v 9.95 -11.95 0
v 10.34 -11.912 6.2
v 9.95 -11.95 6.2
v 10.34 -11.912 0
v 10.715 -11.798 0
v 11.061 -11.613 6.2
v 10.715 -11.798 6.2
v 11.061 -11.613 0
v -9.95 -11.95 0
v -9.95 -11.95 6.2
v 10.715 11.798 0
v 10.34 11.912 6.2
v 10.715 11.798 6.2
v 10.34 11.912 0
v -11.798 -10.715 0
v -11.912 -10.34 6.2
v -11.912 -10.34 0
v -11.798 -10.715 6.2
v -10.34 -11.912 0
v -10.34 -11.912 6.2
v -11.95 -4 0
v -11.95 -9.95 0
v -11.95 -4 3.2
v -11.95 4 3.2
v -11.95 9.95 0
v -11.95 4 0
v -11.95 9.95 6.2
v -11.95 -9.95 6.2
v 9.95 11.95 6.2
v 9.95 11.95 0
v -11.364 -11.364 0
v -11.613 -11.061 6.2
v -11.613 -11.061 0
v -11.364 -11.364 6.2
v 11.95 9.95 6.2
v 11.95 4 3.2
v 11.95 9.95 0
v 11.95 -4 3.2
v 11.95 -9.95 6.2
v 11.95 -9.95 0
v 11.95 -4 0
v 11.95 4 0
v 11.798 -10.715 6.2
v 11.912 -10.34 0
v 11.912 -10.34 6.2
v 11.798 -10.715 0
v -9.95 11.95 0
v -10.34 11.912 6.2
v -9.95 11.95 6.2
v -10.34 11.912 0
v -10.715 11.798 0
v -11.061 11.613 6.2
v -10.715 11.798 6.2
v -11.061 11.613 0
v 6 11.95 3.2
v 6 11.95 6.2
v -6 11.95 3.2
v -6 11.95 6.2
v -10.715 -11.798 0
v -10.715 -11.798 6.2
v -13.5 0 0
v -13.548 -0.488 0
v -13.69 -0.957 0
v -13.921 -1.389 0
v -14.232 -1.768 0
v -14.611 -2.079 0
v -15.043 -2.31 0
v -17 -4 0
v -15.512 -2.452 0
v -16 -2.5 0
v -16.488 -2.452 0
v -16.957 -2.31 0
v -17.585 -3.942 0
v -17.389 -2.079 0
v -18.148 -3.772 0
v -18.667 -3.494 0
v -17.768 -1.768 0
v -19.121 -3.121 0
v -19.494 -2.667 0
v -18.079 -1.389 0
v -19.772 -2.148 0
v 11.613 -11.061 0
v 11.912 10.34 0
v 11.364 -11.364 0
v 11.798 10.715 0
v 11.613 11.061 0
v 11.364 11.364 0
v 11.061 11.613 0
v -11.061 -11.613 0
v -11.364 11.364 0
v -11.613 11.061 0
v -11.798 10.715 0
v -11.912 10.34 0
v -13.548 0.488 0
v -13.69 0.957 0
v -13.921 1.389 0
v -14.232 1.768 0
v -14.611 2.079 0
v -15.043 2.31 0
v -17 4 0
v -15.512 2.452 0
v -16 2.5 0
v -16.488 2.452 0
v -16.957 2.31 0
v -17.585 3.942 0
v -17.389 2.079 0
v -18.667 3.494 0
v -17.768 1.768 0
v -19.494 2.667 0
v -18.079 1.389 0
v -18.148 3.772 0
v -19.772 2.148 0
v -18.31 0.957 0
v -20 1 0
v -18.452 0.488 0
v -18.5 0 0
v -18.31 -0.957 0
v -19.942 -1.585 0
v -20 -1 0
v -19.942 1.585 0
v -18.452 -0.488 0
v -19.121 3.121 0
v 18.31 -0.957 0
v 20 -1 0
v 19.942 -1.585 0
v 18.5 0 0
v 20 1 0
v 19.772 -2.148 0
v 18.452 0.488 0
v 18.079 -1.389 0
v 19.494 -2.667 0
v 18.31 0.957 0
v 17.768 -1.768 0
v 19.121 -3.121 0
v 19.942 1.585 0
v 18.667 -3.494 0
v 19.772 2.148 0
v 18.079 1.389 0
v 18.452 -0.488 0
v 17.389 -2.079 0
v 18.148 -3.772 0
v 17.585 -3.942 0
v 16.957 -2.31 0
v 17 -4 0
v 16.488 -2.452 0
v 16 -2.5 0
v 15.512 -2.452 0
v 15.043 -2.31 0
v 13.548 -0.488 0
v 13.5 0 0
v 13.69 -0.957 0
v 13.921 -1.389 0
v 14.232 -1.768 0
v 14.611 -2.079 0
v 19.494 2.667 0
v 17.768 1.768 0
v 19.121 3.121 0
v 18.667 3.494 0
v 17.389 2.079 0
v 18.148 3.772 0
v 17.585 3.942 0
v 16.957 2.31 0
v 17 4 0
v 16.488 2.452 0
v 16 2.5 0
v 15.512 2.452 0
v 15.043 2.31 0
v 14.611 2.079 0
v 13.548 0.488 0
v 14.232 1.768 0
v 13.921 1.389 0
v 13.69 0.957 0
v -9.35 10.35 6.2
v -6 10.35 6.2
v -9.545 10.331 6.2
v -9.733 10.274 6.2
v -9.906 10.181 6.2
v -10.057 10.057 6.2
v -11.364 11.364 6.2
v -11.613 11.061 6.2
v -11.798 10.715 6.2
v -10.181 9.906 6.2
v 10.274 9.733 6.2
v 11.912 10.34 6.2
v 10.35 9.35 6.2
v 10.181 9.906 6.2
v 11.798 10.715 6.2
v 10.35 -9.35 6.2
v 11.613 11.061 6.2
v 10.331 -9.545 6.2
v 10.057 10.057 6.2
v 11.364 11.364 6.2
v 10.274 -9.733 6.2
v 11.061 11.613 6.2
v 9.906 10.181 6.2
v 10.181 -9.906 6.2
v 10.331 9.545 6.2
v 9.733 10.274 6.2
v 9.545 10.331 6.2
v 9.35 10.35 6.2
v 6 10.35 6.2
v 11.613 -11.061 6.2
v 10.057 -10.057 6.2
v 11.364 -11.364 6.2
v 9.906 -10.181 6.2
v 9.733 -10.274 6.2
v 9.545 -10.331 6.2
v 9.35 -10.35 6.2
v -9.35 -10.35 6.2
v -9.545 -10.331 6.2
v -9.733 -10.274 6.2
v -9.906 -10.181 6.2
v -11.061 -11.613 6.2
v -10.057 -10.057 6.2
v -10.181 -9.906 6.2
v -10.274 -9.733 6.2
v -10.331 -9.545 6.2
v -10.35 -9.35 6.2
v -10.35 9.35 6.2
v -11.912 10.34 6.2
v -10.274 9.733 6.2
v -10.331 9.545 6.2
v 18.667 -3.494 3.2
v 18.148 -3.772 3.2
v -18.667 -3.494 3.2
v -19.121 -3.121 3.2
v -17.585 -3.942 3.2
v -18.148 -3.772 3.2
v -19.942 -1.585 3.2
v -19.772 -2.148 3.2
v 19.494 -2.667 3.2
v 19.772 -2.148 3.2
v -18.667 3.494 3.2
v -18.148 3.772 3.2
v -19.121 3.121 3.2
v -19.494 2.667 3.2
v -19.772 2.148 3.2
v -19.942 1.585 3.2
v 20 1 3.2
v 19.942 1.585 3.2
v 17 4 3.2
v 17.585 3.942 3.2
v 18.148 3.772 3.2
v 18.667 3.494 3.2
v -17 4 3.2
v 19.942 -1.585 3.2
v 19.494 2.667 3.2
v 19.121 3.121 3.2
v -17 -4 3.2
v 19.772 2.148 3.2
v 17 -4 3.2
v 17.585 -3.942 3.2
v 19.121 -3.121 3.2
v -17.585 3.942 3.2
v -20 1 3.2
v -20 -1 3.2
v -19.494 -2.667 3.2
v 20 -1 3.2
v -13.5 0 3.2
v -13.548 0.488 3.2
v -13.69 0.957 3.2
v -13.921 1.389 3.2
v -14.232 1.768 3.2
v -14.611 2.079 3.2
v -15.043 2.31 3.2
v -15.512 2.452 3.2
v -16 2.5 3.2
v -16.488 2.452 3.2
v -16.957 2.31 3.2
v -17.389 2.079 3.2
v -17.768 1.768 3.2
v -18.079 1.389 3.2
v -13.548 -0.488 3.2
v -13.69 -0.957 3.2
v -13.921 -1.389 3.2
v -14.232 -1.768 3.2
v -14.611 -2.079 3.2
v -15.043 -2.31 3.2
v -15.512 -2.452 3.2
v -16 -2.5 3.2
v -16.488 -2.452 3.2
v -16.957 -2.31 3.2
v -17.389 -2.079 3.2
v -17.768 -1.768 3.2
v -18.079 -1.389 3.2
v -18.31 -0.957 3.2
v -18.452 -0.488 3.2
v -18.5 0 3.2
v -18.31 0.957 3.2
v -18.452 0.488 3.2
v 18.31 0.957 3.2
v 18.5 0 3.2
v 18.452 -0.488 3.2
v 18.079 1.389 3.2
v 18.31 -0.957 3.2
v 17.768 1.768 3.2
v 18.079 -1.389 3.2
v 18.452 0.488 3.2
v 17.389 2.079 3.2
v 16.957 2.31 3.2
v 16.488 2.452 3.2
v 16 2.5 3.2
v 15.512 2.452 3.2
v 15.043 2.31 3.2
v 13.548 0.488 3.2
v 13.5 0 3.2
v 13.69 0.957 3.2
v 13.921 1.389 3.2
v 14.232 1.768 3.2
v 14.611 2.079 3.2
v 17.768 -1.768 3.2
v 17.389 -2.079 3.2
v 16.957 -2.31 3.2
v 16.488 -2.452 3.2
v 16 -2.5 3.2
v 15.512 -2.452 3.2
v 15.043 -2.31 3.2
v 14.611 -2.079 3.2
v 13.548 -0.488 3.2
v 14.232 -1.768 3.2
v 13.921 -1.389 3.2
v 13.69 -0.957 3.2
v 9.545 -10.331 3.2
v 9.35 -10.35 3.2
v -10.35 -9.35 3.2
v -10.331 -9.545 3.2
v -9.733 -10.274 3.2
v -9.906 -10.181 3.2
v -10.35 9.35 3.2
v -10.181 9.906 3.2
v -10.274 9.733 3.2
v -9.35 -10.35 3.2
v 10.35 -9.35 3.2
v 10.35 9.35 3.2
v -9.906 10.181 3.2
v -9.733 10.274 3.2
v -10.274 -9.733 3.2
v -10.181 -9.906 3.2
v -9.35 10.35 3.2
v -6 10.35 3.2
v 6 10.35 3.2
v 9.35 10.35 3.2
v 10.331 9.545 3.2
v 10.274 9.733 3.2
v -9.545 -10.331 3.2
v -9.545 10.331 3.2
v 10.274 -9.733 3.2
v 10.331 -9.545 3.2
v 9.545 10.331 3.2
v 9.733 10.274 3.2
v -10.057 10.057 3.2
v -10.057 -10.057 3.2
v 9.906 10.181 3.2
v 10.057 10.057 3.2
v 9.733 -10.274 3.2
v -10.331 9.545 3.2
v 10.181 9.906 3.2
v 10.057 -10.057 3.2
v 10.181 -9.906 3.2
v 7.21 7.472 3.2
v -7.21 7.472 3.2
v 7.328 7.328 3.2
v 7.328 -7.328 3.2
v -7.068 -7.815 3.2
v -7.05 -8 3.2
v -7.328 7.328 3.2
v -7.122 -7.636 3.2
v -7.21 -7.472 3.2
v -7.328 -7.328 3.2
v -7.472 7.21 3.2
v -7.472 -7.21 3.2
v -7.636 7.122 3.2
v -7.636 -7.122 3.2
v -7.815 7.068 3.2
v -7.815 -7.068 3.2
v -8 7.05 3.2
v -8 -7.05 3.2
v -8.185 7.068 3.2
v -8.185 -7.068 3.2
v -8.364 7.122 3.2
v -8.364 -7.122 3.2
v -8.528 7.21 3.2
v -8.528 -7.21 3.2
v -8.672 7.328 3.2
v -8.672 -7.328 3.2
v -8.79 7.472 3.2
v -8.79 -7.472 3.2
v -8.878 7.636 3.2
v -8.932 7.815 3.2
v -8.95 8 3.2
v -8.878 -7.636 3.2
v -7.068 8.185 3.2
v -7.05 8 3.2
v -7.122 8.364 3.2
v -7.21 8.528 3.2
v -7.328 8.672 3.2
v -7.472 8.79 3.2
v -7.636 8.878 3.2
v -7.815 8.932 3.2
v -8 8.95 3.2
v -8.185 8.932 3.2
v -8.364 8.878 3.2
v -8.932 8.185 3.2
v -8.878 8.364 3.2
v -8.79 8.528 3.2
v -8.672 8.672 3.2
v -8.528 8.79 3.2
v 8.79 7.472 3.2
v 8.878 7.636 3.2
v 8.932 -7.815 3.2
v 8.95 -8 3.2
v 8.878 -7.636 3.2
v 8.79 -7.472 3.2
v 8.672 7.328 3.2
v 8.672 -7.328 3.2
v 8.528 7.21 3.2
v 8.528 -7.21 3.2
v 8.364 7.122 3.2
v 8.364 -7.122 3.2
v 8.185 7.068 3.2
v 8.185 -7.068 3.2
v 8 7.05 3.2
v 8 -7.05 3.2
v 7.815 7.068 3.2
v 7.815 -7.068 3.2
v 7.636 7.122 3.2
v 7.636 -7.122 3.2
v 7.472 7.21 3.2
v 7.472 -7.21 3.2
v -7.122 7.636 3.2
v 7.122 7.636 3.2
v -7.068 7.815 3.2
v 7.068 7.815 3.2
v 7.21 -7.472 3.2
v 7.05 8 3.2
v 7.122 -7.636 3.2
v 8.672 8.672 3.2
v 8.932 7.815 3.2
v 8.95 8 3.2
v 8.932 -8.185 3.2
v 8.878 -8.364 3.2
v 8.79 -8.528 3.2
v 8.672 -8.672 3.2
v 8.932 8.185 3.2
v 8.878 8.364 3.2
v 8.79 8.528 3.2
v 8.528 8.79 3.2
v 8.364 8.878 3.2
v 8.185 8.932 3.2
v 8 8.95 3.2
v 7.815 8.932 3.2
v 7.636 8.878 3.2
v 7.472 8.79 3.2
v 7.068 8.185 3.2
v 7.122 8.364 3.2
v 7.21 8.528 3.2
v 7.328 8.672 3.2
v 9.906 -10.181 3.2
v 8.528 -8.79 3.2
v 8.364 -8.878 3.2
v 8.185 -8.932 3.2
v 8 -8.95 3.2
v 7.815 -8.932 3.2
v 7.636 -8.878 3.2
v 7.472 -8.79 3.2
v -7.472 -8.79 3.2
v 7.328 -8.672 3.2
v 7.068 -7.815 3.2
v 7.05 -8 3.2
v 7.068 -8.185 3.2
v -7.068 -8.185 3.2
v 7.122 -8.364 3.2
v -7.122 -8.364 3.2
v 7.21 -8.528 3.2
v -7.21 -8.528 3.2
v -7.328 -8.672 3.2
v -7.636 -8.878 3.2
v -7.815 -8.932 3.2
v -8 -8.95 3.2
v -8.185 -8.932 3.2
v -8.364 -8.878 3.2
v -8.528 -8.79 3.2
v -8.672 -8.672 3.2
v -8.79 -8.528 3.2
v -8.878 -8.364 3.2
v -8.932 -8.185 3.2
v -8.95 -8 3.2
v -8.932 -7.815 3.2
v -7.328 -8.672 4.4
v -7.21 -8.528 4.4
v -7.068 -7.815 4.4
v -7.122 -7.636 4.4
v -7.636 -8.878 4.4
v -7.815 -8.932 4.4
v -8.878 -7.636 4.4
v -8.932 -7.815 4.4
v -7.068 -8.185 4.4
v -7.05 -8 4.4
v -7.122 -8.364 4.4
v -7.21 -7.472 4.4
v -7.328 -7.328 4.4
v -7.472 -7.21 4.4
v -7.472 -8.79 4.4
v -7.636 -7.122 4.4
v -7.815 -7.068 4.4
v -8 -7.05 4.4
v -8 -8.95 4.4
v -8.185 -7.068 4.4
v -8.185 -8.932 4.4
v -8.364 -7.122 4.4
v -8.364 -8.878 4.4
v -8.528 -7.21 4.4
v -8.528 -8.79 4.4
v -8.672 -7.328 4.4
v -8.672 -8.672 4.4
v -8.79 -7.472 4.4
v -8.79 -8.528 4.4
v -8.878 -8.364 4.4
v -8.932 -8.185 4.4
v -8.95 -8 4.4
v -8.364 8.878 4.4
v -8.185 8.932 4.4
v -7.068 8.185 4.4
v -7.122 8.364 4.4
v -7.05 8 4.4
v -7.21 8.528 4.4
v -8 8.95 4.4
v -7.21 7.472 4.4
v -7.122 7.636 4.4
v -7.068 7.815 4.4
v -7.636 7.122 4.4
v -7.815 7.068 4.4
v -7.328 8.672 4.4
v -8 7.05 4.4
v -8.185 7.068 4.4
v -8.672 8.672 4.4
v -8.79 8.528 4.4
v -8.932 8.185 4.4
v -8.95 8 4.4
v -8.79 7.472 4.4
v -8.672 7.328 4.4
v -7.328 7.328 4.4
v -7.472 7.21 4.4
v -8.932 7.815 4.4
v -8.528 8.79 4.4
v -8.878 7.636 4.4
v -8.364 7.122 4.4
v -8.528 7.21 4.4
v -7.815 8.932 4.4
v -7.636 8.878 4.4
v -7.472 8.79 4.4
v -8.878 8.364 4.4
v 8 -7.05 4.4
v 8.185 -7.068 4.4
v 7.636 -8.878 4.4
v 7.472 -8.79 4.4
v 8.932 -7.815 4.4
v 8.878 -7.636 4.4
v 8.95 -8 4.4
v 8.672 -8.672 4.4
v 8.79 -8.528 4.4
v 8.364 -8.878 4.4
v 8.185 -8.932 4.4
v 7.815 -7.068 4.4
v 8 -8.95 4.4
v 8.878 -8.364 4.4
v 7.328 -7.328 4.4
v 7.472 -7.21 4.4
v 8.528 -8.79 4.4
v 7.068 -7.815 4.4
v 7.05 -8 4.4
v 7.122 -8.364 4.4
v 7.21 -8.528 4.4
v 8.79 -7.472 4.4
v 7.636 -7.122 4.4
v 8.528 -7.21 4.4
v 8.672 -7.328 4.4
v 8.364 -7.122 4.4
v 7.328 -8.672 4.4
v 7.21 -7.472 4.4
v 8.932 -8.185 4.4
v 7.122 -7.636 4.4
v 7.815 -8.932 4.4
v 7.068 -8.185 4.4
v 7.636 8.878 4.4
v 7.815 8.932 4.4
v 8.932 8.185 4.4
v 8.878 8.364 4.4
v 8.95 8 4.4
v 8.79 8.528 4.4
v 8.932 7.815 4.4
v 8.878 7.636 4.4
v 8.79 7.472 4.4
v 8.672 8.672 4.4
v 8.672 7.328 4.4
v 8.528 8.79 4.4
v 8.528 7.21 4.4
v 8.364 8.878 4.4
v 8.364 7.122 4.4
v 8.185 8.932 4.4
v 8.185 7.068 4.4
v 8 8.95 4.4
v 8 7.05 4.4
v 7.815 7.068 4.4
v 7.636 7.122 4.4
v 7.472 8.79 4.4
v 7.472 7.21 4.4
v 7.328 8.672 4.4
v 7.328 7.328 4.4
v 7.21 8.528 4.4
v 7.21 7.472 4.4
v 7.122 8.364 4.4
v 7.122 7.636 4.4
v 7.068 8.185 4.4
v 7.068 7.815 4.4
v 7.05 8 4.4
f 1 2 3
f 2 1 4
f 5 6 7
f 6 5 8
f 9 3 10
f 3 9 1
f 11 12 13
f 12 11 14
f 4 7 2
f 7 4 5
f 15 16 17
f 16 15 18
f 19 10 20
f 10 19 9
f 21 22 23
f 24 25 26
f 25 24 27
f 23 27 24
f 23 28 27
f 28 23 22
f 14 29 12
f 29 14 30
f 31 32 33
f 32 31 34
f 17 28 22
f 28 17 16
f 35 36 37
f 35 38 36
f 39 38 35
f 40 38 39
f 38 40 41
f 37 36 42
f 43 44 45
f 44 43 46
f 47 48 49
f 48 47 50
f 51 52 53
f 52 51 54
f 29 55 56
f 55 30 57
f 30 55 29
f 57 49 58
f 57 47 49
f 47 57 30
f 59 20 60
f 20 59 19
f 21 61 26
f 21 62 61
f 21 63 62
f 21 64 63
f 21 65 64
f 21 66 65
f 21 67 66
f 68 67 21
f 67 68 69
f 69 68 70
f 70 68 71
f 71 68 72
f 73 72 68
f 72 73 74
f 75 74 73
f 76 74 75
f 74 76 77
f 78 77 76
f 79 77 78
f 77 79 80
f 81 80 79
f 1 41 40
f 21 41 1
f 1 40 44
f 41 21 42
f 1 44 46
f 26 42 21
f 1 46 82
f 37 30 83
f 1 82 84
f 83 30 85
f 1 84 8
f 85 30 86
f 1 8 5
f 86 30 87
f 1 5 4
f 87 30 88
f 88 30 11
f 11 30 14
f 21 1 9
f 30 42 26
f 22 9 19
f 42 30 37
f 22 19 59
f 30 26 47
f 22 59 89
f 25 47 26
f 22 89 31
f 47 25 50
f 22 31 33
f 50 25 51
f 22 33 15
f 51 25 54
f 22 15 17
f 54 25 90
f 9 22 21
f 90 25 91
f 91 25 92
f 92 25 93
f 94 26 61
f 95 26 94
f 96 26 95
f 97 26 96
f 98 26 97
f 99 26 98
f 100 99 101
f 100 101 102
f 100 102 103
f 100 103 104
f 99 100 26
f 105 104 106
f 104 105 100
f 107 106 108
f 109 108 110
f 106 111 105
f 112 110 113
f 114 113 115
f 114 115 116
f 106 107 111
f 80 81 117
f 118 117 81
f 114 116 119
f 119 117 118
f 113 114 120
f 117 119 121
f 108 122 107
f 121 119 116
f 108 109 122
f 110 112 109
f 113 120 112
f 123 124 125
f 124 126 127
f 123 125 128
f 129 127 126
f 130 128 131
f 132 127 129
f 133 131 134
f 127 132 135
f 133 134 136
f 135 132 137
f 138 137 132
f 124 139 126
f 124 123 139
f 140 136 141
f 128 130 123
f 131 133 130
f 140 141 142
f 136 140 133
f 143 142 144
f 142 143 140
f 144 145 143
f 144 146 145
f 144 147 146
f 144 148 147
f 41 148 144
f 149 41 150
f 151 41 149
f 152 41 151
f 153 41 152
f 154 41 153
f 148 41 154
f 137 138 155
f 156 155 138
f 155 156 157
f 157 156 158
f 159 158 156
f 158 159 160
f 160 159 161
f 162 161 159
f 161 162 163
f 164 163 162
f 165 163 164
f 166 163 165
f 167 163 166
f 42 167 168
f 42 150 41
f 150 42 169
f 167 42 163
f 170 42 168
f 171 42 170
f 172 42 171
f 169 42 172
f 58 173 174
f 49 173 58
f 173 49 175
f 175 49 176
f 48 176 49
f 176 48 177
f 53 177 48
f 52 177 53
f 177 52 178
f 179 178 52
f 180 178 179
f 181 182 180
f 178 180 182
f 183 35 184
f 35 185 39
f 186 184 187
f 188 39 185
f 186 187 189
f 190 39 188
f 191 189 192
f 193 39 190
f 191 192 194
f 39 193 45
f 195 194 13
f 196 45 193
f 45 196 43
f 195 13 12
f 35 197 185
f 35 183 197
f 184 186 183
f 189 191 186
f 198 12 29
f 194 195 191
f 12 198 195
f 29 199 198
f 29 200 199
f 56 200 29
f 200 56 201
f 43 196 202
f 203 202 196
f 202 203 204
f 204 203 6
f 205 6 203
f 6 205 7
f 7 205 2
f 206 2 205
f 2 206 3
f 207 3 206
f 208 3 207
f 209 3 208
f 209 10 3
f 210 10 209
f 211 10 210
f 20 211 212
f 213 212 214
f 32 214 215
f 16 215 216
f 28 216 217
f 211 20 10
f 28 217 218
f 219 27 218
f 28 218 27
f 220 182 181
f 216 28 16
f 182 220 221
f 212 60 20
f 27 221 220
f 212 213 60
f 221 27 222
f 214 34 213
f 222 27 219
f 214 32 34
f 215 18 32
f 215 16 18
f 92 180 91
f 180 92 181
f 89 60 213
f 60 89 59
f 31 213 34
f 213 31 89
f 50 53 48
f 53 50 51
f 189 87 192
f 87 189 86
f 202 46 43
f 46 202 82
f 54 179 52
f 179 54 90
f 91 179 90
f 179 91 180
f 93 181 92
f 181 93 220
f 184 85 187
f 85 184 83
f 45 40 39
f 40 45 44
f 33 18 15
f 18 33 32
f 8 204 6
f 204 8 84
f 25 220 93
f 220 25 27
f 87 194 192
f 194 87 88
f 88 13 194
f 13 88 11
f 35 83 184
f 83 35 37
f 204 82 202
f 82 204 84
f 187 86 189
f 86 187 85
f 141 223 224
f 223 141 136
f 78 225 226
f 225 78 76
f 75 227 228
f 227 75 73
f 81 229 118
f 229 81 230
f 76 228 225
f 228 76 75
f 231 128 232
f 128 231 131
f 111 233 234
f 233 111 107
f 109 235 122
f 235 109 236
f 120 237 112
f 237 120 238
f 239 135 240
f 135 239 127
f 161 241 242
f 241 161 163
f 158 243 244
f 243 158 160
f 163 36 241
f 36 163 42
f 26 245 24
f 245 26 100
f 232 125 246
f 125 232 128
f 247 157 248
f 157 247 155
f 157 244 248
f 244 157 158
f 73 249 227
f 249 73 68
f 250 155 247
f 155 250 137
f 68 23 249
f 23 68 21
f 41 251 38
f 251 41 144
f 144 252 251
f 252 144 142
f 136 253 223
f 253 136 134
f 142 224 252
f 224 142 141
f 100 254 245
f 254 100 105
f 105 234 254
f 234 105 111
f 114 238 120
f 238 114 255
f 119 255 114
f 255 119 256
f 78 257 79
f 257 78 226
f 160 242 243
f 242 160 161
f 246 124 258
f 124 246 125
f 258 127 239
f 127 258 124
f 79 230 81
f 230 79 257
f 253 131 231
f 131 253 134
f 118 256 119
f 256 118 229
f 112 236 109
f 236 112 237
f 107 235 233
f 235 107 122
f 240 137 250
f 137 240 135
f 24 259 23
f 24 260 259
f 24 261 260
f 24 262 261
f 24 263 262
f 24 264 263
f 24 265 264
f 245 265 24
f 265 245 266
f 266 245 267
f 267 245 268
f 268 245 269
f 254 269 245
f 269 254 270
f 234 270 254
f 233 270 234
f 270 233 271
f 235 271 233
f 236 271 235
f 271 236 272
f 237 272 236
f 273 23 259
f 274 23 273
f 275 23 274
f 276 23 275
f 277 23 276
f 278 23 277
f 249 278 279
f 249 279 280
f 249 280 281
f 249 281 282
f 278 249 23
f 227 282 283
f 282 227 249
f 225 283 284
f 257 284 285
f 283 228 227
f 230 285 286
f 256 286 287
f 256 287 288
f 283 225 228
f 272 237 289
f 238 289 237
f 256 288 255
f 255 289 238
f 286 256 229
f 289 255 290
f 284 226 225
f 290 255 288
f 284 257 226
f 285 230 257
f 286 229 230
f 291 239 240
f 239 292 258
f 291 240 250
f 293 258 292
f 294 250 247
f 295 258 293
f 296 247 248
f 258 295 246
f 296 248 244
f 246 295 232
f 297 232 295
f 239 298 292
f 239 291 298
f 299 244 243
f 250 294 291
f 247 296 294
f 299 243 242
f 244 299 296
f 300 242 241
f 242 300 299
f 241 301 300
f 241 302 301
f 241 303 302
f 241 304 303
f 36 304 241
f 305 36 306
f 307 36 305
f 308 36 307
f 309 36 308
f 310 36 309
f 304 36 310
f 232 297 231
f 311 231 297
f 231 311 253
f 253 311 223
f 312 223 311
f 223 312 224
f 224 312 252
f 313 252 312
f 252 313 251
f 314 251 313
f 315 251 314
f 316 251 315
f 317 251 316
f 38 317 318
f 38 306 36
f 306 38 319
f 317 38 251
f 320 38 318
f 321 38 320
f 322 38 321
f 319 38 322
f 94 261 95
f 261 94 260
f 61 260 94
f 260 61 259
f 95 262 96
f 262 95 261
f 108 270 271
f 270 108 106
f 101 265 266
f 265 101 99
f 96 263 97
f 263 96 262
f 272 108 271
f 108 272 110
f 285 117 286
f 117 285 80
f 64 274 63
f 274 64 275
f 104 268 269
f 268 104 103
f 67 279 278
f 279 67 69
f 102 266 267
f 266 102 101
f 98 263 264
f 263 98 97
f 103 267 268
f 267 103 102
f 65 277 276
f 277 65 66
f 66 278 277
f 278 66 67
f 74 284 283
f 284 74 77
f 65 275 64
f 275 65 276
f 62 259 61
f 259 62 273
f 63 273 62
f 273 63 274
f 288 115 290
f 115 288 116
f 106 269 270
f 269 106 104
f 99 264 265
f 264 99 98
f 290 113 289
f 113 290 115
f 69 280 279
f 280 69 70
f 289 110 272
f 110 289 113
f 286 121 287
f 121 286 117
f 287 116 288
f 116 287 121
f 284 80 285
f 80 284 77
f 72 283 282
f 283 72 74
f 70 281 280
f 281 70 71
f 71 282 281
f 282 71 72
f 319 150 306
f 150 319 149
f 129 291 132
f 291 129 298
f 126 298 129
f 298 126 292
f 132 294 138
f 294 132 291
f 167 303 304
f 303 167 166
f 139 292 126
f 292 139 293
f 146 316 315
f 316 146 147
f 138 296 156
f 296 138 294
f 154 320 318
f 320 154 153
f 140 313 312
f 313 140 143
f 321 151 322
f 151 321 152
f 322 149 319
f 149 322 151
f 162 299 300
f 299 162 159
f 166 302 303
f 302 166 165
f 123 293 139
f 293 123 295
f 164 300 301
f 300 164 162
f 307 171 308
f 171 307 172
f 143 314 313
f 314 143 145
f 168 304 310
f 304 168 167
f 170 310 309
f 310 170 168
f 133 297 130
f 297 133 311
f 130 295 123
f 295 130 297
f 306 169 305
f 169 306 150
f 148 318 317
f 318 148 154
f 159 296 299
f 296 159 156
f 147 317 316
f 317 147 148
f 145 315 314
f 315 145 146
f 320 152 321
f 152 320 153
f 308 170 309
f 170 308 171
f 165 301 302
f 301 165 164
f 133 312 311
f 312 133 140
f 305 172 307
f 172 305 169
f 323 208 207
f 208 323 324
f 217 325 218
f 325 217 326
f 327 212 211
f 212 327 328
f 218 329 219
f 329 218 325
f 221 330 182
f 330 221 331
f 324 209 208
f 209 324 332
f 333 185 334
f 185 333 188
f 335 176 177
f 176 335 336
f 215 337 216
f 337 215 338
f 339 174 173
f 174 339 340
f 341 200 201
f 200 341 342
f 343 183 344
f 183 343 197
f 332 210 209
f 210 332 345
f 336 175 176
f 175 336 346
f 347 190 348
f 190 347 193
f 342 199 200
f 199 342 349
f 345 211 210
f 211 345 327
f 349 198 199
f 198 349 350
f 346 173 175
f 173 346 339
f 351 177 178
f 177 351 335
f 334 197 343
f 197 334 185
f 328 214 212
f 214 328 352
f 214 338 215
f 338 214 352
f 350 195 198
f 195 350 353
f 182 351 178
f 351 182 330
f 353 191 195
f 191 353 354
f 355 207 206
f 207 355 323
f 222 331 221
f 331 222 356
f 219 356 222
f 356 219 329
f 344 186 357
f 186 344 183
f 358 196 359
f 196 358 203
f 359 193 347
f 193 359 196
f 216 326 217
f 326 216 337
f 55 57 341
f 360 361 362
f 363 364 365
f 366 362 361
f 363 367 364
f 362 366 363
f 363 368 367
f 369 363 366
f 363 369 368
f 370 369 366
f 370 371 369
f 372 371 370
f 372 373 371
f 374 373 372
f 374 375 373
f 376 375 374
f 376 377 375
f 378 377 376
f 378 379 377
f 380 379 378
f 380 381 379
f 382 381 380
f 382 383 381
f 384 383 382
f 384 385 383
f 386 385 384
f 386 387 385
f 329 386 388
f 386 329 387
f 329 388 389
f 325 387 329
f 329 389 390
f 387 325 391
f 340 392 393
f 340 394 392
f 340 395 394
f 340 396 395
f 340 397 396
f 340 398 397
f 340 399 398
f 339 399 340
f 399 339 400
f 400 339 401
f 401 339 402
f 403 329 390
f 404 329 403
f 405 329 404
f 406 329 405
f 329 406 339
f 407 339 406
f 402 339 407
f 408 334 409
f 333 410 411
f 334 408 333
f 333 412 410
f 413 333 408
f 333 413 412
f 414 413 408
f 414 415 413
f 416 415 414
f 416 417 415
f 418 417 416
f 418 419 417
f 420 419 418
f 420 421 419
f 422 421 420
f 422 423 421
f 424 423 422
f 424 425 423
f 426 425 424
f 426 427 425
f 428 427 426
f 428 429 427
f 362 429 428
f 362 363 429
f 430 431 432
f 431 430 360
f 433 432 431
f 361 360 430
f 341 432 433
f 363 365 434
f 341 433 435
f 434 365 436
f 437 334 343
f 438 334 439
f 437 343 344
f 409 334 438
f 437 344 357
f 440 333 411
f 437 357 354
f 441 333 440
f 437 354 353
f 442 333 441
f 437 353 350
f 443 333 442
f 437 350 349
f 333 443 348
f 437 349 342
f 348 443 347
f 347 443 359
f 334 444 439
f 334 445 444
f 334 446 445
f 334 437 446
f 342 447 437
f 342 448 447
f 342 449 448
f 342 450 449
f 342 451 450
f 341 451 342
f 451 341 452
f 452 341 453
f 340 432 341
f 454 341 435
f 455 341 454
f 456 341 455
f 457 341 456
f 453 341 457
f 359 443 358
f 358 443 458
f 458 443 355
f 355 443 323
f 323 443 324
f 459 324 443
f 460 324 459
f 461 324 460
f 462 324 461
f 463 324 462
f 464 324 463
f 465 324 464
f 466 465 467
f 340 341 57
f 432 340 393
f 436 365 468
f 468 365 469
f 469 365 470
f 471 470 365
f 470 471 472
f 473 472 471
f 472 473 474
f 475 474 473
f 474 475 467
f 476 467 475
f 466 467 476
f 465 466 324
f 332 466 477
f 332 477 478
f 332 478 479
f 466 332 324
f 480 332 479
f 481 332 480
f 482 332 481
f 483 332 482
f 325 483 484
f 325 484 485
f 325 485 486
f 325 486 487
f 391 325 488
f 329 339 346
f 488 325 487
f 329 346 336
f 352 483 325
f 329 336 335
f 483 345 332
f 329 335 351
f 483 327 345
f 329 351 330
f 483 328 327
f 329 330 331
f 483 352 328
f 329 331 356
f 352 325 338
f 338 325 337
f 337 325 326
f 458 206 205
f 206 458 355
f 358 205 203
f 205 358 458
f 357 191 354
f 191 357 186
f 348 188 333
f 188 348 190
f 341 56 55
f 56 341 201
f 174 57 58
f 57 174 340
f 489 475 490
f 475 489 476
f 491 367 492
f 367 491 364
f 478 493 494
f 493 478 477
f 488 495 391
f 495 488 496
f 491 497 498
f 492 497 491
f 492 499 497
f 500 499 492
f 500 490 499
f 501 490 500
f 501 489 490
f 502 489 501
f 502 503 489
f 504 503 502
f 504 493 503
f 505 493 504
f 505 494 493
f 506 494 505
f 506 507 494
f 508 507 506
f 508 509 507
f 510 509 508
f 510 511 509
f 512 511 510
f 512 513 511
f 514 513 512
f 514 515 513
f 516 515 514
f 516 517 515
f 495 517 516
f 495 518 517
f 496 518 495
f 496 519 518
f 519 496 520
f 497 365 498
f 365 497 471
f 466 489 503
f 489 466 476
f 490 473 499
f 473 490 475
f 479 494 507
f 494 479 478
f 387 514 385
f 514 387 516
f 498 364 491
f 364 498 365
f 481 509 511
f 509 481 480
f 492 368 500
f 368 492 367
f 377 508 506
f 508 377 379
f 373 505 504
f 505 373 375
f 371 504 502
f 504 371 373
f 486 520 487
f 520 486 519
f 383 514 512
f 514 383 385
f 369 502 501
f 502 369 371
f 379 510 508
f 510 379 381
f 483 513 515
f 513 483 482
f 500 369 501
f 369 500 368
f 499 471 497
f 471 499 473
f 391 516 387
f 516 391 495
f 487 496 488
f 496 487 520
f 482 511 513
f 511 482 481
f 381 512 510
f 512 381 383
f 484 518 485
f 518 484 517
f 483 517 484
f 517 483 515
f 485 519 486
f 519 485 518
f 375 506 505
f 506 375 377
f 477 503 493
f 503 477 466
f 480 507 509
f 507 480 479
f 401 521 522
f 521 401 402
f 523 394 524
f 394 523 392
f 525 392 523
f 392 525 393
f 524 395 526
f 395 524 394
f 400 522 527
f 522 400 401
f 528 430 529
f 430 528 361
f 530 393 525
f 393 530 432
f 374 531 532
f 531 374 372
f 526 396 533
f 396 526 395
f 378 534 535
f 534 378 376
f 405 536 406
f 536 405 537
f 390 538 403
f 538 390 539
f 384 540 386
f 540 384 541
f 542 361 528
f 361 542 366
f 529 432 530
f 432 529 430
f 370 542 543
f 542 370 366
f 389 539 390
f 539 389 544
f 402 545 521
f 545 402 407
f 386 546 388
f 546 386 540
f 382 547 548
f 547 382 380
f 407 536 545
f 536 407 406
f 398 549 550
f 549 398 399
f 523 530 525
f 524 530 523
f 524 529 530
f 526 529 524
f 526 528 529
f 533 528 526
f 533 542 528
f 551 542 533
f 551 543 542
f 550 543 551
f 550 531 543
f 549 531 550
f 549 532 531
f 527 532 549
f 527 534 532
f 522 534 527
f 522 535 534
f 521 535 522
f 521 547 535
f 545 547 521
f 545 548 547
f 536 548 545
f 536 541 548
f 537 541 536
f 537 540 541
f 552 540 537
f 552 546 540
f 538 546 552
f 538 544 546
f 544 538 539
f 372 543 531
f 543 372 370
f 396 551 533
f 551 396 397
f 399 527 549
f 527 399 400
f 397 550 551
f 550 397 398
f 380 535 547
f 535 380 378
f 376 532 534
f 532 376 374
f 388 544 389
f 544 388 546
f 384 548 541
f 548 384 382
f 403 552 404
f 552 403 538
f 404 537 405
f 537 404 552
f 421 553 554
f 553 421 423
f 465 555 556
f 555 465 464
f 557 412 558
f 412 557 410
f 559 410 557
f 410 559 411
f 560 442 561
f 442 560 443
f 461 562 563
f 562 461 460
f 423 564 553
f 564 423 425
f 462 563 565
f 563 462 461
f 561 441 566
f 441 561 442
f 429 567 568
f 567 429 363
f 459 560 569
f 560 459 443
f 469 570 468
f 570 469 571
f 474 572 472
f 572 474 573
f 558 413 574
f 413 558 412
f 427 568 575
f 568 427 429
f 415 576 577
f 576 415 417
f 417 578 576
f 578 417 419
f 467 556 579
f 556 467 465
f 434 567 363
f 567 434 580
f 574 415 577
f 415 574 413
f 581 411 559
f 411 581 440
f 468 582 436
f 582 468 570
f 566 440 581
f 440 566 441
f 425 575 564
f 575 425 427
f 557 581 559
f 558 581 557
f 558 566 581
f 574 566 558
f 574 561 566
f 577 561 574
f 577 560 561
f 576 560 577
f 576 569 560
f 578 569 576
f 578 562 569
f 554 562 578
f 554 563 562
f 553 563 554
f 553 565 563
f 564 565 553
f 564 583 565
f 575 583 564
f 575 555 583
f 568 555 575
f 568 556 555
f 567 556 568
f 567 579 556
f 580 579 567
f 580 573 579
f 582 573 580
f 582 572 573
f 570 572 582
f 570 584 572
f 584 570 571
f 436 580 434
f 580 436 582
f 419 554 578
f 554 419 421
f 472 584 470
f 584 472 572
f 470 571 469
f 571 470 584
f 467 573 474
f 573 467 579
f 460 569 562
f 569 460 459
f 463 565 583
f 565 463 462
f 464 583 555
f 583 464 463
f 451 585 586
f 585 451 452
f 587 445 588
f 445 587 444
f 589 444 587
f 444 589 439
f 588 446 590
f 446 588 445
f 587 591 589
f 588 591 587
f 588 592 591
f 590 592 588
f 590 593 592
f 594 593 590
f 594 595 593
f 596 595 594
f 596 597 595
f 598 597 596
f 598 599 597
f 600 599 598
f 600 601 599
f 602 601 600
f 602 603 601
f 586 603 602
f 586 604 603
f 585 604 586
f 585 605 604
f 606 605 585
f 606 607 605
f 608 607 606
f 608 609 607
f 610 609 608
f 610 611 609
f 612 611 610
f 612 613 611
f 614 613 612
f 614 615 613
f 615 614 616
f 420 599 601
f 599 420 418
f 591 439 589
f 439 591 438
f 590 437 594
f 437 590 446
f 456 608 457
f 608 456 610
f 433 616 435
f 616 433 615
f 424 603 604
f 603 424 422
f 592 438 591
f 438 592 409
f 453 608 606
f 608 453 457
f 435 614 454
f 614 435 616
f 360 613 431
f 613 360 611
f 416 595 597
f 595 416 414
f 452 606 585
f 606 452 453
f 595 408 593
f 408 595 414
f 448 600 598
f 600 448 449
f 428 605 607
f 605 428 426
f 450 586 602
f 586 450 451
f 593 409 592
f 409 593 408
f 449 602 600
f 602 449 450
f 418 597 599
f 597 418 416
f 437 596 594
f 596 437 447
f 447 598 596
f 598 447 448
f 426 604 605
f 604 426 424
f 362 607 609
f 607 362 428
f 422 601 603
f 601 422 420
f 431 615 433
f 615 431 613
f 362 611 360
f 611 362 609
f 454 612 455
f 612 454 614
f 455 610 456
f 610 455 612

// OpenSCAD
// file: rm_common.scad
// RobotMind V3 mechanical standard. All dimensions are millimetres.
$fn = 32;

RM_EPS = 0.1;
RM_UNIT = 40;
RM_GRID = 8;
RM_PLATE_T = 3.2;
RM_HOLE_D = 5.0;
RM_FIT = 0; // positive is looser; tune in 0.05 mm steps

RM_CORNER_R = 3;
RM_PIN_HEAD_D = 8;
RM_PIN_HEAD_T = 1.6;
RM_PIN_STEM_D = 4.7-2*RM_FIT;
RM_PIN_GRIP_D = 5.3-2*RM_FIT;
RM_PIN_TIP_D = 4.2-2*RM_FIT;
RM_PIN_SPLIT = 1.0;
RM_PIN_STACK = 2*RM_PLATE_T;
RM_PIN_TIP_LENGTH = 1.6;

assert(RM_UNIT%RM_GRID == 0, "The 40 mm unit must follow the 8 mm grid");
assert(RM_PLATE_T > 0 && RM_HOLE_D+2*RM_FIT > 0,
       "Plate and hole dimensions must stay positive");
assert(RM_PIN_GRIP_D > RM_PIN_STEM_D && RM_PIN_STEM_D > RM_PIN_TIP_D,
       "RM_FIT is outside the printable pin range");
assert(RM_PIN_TIP_D > 0, "RM_FIT makes the push pin invalid");

function rm_hole_d(delta=0) = RM_HOLE_D+2*RM_FIT+delta;
function grid_count(span) = round(span/RM_GRID);
function grid_position(i,span) = -span/2+RM_GRID/2+i*RM_GRID;

module rounded_box(size=[20,20,3], r=2) {
  linear_extrude(height=size[2])
    offset(r=r) offset(delta=-r) square([size[0],size[1]]);
}

module rounded_plate(size=[RM_UNIT,RM_UNIT], t=RM_PLATE_T,
                     r=RM_CORNER_R) {
  translate([-size[0]/2,-size[1]/2,0]) rounded_box([size[0],size[1],t],r);
}

module hole_at(point=[0,0], t=RM_PLATE_T, d=rm_hole_d()) {
  translate([point[0],point[1],-RM_EPS])
    cylinder(h=t+2*RM_EPS,d=d);
}

module grid_holes(size=[RM_UNIT,RM_UNIT], t=RM_PLATE_T) {
  for(ix=[0:grid_count(size[0])-1], iy=[0:grid_count(size[1])-1])
    hole_at([grid_position(ix,size[0]),grid_position(iy,size[1])],t);
}

module plate(size=[RM_UNIT,RM_UNIT]) {
  assert(size[0]%RM_UNIT == 0 && size[1]%RM_UNIT == 0,
         "Plate dimensions must be whole 40 mm units");
  difference() {
    rounded_plate(size);
    grid_holes(size);
  }
}

// Four pins, two per plate, make a rigid coplanar seam. Mount below the
// plates when the visible surface must stay flat.
module flat_link() {
  size=[2*RM_GRID,3*RM_GRID];
  difference() {
    rounded_plate(size,RM_PLATE_T,RM_CORNER_R);
    for(x=[-RM_GRID/2,RM_GRID/2], y=[-RM_GRID,RM_GRID])
      hole_at([x,y]);
  }
}

// The same plate holes accept this plain inside bracket at 90 degrees.
module angle_link() {
  width=3*RM_GRID;
  leg=1.5*RM_GRID;
  difference() {
    union() {
      translate([-width/2,-leg,0]) cube([width,leg,RM_PLATE_T]);
      translate([-width/2,-RM_PLATE_T,0])
        cube([width,RM_PLATE_T,leg]);
    }
    for(x=[-RM_GRID,RM_GRID]) {
      hole_at([x,-RM_GRID/2]);
      translate([x,RM_EPS,RM_GRID/2]) rotate([90,0,0])
        cylinder(h=RM_PLATE_T+2*RM_EPS,d=rm_hole_d());
    }
  }
}

// One split pin joins any two RM_PLATE_T layers. The head and flexible tip
// provide tool-free assembly; the same holes also accept M4 bolts.
module push_pin(grip_delta=0) {
  grip=RM_PIN_GRIP_D+grip_delta;
  difference() {
    union() {
      cylinder(h=RM_PIN_HEAD_T,d=RM_PIN_HEAD_D);
      translate([0,0,RM_PIN_HEAD_T])
        cylinder(h=RM_PIN_STACK-0.8,d=RM_PIN_STEM_D);
      translate([0,0,RM_PIN_HEAD_T+RM_PIN_STACK-0.8])
        cylinder(h=1,d1=RM_PIN_STEM_D,d2=grip);
      translate([0,0,RM_PIN_HEAD_T+RM_PIN_STACK+0.2])
        cylinder(h=RM_PIN_TIP_LENGTH-0.2,d1=grip,d2=RM_PIN_TIP_D);
    }
    translate([-RM_PIN_SPLIT/2,-grip,
               RM_PIN_HEAD_T+1.5])
      cube([RM_PIN_SPLIT,2*grip,
            RM_PIN_STACK+RM_PIN_TIP_LENGTH]);
  }
}
// main file
include <rm_common.scad>

PCB=[20,20];
GROVE_CLEARANCE=0.35+RM_FIT;
GROVE_WALL=1.6;
GROVE_WALL_H=3;
GROVE_PEG_D=1.9-2*RM_FIT;
assert(GROVE_PEG_D > 0, "RM_FIT makes the Grove pegs invalid");

module grove_20x20_carrier() {
  pocket=[PCB[0]+2*GROVE_CLEARANCE,PCB[1]+2*GROVE_CLEARANCE];
  outer=[pocket[0]+2*GROVE_WALL,pocket[1]+2*GROVE_WALL];
  difference() {
    union() {
      translate([-outer[0]/2,-outer[1]/2,0])
        rounded_box([outer[0],outer[1],RM_PLATE_T+GROVE_WALL_H],2);
      translate([-RM_UNIT/2,-RM_GRID/2,0])
        rounded_box([RM_UNIT,RM_GRID,RM_PLATE_T],RM_CORNER_R);
    }
    translate([-pocket[0]/2,-pocket[1]/2,RM_PLATE_T])
      rounded_box([pocket[0],pocket[1],GROVE_WALL_H+RM_EPS],1);
    translate([-6,outer[1]/2-GROVE_WALL-RM_EPS,RM_PLATE_T])
      cube([12,2*GROVE_WALL+2*RM_EPS,GROVE_WALL_H+RM_EPS]);
    for(x=[-2*RM_GRID,2*RM_GRID]) hole_at([x,0]);
  }
  for(x=[-RM_GRID,RM_GRID], y=[-RM_GRID,RM_GRID])
    translate([x,y,RM_PLATE_T]) cylinder(h=1.2,d=GROVE_PEG_D);
}

grove_20x20_carrier();
